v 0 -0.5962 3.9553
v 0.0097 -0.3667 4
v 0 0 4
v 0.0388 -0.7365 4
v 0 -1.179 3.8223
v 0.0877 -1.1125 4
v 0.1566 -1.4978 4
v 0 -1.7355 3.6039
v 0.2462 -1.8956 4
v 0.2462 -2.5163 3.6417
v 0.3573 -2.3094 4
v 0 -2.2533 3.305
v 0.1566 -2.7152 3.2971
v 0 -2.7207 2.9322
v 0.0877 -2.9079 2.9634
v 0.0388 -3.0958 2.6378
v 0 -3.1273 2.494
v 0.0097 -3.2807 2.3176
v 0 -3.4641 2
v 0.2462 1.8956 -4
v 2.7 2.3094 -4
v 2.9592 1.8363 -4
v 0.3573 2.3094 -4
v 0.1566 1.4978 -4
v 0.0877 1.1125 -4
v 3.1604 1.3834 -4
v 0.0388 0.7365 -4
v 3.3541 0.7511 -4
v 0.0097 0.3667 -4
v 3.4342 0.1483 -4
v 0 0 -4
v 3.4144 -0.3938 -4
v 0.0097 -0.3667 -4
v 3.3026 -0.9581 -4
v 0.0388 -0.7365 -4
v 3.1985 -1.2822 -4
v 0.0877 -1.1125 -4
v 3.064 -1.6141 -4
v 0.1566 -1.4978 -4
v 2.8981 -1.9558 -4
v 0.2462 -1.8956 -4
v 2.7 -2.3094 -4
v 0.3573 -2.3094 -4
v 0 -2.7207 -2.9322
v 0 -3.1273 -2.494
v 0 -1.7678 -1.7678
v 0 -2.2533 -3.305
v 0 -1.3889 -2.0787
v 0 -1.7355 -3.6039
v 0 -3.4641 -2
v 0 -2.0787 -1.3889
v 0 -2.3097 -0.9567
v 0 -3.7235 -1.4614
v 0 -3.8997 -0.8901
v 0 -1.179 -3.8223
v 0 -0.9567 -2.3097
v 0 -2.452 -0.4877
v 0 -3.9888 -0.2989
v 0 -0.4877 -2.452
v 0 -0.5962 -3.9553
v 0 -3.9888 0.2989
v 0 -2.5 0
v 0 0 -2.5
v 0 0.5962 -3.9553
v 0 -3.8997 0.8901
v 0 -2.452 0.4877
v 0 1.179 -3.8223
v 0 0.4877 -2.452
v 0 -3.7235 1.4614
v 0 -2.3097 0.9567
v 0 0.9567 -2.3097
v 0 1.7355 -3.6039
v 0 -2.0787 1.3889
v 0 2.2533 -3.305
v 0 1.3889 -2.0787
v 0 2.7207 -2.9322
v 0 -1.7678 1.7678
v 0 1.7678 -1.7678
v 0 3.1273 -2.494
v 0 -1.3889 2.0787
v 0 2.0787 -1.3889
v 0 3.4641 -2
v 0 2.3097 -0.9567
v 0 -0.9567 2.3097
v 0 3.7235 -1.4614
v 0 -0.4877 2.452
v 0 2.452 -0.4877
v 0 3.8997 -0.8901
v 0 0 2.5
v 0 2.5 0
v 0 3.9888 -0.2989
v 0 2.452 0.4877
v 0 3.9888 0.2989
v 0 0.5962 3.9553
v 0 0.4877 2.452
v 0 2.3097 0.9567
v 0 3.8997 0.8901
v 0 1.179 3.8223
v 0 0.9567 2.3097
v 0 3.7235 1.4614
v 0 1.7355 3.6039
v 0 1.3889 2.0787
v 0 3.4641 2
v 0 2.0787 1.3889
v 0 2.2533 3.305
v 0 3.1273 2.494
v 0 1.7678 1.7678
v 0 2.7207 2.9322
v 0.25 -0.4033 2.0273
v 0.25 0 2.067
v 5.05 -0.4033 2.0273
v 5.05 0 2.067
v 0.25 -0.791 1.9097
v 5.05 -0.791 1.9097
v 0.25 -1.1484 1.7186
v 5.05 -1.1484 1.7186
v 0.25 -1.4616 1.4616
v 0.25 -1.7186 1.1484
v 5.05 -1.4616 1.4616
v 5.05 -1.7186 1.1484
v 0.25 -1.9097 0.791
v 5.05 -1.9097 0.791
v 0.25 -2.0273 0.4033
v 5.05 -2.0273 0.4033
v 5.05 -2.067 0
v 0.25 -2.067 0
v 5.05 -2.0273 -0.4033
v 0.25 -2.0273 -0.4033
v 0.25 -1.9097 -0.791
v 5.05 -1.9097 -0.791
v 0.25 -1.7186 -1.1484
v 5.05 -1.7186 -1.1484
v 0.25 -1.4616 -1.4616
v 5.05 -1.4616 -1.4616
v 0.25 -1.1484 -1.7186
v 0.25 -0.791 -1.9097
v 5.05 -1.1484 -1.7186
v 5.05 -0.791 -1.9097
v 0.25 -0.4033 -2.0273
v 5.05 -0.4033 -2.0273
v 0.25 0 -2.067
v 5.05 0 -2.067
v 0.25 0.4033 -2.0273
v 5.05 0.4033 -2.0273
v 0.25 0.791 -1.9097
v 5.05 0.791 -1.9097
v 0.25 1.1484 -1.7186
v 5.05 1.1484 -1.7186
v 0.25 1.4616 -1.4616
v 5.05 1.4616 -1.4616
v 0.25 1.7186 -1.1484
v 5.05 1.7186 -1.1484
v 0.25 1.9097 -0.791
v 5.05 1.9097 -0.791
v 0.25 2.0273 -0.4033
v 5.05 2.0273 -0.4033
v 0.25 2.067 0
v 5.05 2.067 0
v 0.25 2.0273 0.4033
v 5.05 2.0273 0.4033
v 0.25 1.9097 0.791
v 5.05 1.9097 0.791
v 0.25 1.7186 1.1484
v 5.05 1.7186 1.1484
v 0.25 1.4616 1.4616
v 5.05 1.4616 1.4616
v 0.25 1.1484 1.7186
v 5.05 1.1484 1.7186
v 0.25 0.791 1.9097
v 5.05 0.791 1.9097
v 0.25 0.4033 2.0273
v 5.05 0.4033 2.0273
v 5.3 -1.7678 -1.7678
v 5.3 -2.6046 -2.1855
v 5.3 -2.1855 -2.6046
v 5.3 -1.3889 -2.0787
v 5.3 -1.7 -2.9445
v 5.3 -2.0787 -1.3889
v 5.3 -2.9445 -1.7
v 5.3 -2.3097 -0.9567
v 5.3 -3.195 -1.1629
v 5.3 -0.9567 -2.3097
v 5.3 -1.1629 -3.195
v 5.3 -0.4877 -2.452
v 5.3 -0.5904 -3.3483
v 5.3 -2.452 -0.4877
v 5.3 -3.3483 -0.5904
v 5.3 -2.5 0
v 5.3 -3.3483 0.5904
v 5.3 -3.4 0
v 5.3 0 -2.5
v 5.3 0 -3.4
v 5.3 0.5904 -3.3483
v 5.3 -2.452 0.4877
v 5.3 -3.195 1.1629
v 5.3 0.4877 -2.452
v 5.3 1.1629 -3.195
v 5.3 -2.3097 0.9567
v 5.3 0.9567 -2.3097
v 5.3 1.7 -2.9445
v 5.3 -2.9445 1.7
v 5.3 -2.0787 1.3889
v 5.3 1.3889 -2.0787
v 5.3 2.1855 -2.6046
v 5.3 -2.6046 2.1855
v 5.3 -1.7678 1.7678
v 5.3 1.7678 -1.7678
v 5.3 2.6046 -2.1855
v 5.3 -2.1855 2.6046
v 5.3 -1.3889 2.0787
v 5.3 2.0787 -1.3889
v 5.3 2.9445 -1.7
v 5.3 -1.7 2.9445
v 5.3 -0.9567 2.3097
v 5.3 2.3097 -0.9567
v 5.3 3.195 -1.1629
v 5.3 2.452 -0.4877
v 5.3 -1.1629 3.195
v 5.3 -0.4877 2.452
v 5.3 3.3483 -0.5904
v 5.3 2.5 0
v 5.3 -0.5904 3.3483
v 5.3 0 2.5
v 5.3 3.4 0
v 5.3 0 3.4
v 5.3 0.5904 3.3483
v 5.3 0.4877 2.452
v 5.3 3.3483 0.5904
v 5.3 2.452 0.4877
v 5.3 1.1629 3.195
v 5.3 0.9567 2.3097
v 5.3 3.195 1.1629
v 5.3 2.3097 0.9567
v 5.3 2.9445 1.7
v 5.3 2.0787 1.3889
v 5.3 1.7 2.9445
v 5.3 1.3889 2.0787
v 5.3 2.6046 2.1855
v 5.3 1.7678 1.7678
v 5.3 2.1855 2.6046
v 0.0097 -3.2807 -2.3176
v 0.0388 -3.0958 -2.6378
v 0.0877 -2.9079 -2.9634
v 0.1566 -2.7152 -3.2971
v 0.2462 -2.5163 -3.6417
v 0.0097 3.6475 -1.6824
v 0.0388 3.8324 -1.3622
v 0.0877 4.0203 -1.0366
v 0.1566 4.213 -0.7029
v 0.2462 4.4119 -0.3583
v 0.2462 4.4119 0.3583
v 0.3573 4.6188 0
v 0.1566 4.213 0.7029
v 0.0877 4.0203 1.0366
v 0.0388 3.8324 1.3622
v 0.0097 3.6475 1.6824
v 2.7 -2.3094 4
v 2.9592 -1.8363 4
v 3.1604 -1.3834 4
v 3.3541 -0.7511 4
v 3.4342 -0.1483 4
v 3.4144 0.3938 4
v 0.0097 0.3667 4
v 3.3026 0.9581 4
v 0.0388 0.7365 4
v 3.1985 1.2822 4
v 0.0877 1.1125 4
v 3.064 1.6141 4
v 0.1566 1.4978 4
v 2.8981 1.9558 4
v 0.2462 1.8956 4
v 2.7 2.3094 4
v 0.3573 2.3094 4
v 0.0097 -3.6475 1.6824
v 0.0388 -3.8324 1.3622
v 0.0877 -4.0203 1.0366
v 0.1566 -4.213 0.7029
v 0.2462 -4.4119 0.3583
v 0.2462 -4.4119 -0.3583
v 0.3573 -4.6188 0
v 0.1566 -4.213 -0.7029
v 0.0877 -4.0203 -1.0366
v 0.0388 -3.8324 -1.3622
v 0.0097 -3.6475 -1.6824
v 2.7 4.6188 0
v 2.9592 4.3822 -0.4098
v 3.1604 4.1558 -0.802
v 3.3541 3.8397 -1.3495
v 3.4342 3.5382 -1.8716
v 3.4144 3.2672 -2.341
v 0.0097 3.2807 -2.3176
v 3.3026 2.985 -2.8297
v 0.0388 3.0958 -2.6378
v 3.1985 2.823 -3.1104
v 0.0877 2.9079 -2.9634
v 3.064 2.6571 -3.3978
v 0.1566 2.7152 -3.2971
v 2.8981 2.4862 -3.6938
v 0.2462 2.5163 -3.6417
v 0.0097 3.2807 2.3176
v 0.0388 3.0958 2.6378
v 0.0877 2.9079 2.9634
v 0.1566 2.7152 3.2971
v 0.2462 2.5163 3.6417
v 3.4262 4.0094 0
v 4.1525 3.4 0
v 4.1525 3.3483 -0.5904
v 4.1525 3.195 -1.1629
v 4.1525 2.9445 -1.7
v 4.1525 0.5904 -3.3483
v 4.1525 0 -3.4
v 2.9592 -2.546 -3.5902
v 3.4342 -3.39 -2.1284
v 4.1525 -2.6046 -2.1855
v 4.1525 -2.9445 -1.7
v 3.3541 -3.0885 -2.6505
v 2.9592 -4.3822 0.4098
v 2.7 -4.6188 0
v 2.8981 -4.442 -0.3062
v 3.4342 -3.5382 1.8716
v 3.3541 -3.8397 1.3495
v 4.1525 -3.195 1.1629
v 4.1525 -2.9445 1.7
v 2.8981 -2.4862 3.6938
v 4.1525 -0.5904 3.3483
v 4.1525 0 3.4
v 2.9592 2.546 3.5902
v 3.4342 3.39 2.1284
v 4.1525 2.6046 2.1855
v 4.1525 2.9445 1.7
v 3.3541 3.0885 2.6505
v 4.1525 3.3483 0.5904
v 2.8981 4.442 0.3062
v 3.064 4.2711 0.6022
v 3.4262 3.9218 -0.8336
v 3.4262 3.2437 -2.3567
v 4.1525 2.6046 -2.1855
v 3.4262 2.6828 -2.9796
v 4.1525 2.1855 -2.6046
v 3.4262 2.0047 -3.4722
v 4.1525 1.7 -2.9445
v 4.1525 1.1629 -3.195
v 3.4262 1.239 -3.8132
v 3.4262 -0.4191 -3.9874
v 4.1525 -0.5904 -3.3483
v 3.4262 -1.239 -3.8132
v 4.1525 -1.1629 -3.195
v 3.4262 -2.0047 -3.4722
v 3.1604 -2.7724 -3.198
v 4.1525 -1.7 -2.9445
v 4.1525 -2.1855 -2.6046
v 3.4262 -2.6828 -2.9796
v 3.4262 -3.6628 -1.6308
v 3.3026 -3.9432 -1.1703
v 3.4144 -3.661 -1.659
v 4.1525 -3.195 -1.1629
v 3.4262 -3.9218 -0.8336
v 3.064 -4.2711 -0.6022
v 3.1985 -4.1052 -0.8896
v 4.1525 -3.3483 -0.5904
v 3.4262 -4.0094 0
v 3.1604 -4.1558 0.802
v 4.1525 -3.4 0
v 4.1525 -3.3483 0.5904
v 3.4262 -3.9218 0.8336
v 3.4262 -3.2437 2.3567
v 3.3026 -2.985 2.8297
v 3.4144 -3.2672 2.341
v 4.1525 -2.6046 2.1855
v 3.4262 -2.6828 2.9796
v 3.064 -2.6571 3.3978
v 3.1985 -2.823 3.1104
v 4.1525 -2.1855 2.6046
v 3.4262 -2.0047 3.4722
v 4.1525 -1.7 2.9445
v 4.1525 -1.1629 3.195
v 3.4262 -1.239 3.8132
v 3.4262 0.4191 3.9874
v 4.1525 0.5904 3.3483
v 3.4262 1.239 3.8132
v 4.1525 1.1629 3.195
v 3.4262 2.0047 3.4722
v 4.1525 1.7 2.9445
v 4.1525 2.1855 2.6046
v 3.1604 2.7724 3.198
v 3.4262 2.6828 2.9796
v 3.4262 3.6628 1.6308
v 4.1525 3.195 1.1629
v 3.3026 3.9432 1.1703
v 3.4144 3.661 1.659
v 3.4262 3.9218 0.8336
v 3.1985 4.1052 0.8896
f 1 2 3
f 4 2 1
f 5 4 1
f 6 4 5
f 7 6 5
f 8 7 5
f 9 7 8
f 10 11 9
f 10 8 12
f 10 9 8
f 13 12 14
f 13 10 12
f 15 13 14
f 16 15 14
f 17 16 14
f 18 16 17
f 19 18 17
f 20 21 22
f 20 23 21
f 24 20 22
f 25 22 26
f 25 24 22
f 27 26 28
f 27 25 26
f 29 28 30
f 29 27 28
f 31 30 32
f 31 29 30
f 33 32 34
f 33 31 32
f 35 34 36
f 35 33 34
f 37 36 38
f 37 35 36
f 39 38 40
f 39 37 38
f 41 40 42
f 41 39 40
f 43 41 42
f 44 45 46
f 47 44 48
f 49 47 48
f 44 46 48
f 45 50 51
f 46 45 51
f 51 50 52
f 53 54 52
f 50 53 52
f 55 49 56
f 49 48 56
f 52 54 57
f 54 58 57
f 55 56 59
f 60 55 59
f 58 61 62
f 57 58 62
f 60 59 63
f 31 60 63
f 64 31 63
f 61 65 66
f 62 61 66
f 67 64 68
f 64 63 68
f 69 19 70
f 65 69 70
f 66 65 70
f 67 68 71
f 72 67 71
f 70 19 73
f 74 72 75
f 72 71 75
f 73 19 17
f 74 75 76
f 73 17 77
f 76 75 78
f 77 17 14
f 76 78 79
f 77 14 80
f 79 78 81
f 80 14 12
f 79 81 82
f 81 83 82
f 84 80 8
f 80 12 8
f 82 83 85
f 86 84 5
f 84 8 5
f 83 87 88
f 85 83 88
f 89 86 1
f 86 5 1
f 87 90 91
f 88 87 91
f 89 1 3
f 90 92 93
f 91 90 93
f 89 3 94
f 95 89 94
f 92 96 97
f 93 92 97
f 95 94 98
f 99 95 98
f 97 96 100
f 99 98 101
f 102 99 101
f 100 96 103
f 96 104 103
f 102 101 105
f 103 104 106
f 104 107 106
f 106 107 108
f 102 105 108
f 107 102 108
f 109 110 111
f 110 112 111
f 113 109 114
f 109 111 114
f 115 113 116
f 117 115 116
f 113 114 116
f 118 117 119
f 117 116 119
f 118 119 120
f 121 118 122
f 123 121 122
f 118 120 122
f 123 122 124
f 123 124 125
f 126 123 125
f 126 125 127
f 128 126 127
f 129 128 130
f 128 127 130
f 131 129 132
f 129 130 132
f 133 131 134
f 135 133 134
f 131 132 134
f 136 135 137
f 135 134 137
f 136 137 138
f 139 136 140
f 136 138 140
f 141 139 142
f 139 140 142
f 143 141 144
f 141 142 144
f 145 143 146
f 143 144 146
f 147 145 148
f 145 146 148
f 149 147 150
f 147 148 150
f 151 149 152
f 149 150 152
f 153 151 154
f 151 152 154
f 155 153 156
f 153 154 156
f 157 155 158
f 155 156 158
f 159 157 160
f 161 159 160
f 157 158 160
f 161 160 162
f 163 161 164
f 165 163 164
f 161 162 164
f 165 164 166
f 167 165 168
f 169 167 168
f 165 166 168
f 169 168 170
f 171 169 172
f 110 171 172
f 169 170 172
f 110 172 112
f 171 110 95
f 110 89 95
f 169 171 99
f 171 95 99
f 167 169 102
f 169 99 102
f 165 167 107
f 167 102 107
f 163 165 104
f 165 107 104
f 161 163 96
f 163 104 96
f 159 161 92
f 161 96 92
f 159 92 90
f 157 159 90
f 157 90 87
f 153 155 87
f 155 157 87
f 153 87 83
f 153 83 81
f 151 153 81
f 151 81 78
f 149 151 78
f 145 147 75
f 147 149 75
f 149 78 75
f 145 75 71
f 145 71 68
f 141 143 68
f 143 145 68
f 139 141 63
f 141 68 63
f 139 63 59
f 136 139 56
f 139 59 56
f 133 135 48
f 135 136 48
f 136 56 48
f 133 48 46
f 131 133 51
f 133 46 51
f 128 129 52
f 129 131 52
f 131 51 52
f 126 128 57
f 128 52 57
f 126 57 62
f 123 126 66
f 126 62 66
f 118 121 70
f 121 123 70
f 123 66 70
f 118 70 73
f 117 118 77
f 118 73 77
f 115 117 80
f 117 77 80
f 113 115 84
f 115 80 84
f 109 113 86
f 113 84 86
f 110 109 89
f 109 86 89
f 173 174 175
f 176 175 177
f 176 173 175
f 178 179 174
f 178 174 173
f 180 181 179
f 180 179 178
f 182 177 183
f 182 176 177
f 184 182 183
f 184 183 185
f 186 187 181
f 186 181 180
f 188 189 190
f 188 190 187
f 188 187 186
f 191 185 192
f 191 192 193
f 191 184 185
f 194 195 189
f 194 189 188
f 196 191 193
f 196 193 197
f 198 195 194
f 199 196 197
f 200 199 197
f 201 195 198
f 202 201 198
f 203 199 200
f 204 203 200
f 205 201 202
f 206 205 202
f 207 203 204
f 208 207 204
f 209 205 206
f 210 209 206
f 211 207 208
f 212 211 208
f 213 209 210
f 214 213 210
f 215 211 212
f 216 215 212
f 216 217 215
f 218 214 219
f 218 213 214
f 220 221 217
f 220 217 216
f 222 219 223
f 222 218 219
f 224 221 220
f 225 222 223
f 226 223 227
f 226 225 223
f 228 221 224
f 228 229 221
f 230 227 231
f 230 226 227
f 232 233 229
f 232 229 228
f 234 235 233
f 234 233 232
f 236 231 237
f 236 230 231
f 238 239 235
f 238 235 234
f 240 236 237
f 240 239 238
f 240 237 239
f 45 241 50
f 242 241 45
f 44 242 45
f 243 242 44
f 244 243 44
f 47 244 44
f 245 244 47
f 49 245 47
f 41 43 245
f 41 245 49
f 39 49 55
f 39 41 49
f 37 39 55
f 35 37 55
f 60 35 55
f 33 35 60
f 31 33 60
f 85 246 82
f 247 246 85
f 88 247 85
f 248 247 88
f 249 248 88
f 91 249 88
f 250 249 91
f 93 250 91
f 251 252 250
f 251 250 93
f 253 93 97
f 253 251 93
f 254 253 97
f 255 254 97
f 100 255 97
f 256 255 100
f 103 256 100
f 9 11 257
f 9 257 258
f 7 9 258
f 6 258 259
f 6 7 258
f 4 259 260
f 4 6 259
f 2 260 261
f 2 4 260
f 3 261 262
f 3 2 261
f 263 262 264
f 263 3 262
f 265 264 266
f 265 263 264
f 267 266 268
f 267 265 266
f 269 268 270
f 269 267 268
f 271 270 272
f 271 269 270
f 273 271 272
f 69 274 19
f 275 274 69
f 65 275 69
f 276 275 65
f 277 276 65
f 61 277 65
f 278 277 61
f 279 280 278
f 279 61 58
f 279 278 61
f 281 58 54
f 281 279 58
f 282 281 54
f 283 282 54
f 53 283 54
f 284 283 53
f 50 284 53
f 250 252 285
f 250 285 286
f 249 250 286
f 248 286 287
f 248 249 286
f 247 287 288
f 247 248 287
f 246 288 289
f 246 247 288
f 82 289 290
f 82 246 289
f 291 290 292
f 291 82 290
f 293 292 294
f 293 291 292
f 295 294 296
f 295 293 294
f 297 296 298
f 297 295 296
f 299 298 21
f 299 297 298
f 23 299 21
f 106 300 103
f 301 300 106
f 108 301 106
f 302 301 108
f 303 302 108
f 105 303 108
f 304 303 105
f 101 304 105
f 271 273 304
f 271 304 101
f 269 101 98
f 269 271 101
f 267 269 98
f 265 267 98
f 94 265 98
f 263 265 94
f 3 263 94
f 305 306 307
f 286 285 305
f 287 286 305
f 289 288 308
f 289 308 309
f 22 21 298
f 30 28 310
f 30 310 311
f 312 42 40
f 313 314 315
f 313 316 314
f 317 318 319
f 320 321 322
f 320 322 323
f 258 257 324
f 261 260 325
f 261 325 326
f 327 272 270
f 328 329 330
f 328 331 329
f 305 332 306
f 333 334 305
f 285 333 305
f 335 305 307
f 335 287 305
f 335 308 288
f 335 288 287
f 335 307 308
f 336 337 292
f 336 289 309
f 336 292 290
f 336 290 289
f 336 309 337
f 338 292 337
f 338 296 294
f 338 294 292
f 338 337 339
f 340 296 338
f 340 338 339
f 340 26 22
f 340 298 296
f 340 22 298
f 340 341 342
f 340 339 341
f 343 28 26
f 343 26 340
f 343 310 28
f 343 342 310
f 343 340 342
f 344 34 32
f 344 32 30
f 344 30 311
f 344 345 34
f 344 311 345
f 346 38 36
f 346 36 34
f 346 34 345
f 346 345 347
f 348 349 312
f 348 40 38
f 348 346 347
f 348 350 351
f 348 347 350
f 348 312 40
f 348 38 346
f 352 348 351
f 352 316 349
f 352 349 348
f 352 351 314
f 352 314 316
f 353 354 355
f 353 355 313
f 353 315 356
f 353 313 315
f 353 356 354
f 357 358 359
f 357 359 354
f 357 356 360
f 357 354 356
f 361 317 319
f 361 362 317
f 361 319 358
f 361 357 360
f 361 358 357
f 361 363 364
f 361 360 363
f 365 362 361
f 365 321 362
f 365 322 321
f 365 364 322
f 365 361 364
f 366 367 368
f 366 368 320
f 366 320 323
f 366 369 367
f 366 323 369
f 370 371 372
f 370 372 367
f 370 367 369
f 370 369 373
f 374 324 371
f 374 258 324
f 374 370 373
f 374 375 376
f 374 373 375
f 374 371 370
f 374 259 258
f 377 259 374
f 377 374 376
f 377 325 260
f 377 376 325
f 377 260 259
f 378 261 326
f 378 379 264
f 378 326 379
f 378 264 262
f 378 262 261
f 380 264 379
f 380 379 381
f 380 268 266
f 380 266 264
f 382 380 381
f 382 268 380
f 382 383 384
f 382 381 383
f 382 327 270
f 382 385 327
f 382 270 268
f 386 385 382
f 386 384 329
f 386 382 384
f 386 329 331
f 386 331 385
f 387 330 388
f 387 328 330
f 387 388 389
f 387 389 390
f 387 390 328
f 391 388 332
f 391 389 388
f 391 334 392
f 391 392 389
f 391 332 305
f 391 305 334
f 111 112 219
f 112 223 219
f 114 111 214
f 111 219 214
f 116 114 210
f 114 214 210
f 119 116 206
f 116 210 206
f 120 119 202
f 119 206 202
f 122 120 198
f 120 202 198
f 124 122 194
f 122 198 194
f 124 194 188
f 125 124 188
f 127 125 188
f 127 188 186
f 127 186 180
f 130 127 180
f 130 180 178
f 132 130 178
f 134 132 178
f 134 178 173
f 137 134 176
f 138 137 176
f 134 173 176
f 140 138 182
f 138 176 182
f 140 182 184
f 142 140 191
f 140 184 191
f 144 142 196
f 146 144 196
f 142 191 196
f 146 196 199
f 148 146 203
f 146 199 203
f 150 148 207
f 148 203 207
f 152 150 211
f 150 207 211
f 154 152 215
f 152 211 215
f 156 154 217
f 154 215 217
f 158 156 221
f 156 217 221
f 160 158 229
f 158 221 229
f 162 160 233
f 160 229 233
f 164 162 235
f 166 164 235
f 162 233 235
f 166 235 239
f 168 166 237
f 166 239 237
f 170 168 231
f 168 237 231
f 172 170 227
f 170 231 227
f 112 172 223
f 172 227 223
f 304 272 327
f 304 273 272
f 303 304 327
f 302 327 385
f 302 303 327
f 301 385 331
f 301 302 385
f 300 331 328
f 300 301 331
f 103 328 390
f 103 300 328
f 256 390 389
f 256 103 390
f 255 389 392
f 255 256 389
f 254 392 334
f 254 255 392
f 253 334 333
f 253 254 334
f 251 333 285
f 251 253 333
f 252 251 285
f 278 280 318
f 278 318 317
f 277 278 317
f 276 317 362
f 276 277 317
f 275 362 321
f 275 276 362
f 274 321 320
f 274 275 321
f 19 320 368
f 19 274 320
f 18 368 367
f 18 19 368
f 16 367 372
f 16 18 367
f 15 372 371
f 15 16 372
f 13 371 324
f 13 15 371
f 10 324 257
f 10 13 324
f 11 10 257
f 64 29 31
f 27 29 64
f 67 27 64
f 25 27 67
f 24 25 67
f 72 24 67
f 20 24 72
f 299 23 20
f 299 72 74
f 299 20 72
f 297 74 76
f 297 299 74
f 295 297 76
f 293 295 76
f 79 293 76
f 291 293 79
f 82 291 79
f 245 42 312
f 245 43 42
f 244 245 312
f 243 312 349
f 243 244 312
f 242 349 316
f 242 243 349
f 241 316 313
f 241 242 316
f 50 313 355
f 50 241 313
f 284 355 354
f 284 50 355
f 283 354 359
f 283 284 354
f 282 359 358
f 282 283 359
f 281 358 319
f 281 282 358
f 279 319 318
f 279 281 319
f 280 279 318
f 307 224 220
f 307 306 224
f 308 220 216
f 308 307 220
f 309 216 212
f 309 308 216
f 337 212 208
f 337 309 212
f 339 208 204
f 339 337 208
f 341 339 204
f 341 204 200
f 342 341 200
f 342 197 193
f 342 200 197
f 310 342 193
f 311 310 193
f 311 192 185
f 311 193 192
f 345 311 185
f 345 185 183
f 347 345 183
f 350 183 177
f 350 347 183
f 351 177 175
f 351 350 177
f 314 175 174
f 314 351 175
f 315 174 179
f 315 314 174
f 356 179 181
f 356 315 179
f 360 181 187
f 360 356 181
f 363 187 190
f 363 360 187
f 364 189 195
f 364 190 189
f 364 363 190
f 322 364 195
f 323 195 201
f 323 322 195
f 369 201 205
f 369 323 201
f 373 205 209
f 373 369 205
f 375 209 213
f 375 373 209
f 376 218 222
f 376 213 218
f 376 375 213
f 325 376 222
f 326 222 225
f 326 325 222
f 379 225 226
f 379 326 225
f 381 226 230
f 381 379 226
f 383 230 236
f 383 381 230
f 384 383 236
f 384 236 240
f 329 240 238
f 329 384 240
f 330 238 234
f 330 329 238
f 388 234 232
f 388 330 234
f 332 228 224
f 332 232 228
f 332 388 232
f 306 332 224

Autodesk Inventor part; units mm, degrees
ref_plane "YZ Plane" through (0, 0, 0) normal (1, 0, 0) x (0, 1, 0)
ref_plane "XZ Plane" through (0, 0, 0) normal (0, 1, 0) x (-1, 0, 0)
sketch "Sketch1" plane through (0, 0, 0) normal (1, 0, 0) x (0, 1, 0)
  line L0 (-4.6188, 0) -> (-2.3094, 4)
  line L1 (-2.3094, 4) -> (2.3094, 4)
  line L2 (2.3094, 4) -> (4.6188, 0)
  line L3 (4.6188, 0) -> (2.3094, -4)
  line L4 (2.3094, -4) -> (-2.3094, -4)
  line L5 (-2.3094, -4) -> (-4.6188, 0)
  point P0 (0, 0)
  point P1 (0, 0)
  dimension "d0" = 9.2376
extrude "Body" add sketch "Sketch1" along normal blind 5.3
sketch "Sketch2" plane through (0, 0, 0) normal (-1, 0, 0) x (0, 0, 1)
  line L0 (0, -6.4663) -> (0, 6.4663) projected
  line L1 (-5.6, 0) -> (5.6, 0) projected
  point P0 (0, 0)
hole "Thread" at (0, 0, 0) direction (1, 0, 0) diameter 4.134 end through all thread size "M5x0.8" class "6H" standard "ANSI Metric M Profile"
chamfer "Chamfer1" distance 0.433 angle 30 1 edges at (0, 0, -2.067) measured on face at (0, -2.8764, -1.7247)
chamfer "Chamfer2" distance 0.433 angle 30 1 edges at (5.3, 0, -2.067) measured on face at (5.3, -2.8764, -1.7247)
sketch "Sketch3" plane through (0, 0, 0) normal (0, 0, 1) x (1, 0, 0)
  line L0 (0, 2.3094) -> (0, 4.6188) projected
  line L1 (0, 4.6188) -> (5.3, 4.6188) projected
  line L2 (5.3, 2.3094) -> (5.3, 4.6188) projected
  line L3 (-1.06, 0) -> (6.36, 0) projected
  line L4 (0.3573, 4.6188) -> (0, 4)
  line L5 (5.3, 3.4) -> (4.1525, 3.4)
  line L6 (4.1525, 3.4) -> (2.7, 4.6188)
  dimension "d3" = 30
  dimension "d5" = 8
  dimension "d6" = 6.8
  dimension "d8" = 50
  dimension "d9" = 2.7
revolve "Chamfer3" cut sketch "Sketch3" angle 360 about axis through (-10, 0, 0) along (1, 0, 0)
ref_plane "Work Plane1" through (13.32, 0, 0) normal (0, 0, 1) x (-1, 0, 0)
equation "\"d0\" = 1.1547 * SW"
equation "\"d1\" = KOH"
equation "\"d3\" = ANG1"
equation "\"d5\" = SW0"
equation "\"d6\" = SW1"
equation "\"d8\" = ANG2"
equation "\"d9\" = KOH1"
equation "\"d10\" = -0.5 * GD1 + 0.5 * NND"
equation "\"d39\" = -0.5 * GD1 + 0.5 * NND"
equation "\"d12\" = -0.5 * GD1 + 0.5 * NND"
equation "\"d40\" = -0.5 * GD1 + 0.5 * NND"
equation "\"ANG1\" = 30deg"
equation "\"ANG2\" = 50deg"
equation "\"NND\" = 5"
equation "\"KOH\" = 5.3"
equation "\"SW\" = 8"
equation "\"SW0\" = SW"
equation "\"SW1\" = 0.85 * SW"
equation "\"KOH1\" = 2.7"
equation "\"GUL\" = 0.541266 * PTC"
equation "\"THREADDIA\" = 5"
equation "\"TOA\" = 30deg"
equation "\"PTC\" = 0.8"
equation "\"E0\" = 1.155 * SW"
equation "\"GAL\" = 0.541266 * PTC"
equation "\"GD1\" = 4.133975"
properties part number "ANSI B18.16.3M - Property Class 9 - Metric M5 x 0.8 Metal Type" material "Steel, Mild"
